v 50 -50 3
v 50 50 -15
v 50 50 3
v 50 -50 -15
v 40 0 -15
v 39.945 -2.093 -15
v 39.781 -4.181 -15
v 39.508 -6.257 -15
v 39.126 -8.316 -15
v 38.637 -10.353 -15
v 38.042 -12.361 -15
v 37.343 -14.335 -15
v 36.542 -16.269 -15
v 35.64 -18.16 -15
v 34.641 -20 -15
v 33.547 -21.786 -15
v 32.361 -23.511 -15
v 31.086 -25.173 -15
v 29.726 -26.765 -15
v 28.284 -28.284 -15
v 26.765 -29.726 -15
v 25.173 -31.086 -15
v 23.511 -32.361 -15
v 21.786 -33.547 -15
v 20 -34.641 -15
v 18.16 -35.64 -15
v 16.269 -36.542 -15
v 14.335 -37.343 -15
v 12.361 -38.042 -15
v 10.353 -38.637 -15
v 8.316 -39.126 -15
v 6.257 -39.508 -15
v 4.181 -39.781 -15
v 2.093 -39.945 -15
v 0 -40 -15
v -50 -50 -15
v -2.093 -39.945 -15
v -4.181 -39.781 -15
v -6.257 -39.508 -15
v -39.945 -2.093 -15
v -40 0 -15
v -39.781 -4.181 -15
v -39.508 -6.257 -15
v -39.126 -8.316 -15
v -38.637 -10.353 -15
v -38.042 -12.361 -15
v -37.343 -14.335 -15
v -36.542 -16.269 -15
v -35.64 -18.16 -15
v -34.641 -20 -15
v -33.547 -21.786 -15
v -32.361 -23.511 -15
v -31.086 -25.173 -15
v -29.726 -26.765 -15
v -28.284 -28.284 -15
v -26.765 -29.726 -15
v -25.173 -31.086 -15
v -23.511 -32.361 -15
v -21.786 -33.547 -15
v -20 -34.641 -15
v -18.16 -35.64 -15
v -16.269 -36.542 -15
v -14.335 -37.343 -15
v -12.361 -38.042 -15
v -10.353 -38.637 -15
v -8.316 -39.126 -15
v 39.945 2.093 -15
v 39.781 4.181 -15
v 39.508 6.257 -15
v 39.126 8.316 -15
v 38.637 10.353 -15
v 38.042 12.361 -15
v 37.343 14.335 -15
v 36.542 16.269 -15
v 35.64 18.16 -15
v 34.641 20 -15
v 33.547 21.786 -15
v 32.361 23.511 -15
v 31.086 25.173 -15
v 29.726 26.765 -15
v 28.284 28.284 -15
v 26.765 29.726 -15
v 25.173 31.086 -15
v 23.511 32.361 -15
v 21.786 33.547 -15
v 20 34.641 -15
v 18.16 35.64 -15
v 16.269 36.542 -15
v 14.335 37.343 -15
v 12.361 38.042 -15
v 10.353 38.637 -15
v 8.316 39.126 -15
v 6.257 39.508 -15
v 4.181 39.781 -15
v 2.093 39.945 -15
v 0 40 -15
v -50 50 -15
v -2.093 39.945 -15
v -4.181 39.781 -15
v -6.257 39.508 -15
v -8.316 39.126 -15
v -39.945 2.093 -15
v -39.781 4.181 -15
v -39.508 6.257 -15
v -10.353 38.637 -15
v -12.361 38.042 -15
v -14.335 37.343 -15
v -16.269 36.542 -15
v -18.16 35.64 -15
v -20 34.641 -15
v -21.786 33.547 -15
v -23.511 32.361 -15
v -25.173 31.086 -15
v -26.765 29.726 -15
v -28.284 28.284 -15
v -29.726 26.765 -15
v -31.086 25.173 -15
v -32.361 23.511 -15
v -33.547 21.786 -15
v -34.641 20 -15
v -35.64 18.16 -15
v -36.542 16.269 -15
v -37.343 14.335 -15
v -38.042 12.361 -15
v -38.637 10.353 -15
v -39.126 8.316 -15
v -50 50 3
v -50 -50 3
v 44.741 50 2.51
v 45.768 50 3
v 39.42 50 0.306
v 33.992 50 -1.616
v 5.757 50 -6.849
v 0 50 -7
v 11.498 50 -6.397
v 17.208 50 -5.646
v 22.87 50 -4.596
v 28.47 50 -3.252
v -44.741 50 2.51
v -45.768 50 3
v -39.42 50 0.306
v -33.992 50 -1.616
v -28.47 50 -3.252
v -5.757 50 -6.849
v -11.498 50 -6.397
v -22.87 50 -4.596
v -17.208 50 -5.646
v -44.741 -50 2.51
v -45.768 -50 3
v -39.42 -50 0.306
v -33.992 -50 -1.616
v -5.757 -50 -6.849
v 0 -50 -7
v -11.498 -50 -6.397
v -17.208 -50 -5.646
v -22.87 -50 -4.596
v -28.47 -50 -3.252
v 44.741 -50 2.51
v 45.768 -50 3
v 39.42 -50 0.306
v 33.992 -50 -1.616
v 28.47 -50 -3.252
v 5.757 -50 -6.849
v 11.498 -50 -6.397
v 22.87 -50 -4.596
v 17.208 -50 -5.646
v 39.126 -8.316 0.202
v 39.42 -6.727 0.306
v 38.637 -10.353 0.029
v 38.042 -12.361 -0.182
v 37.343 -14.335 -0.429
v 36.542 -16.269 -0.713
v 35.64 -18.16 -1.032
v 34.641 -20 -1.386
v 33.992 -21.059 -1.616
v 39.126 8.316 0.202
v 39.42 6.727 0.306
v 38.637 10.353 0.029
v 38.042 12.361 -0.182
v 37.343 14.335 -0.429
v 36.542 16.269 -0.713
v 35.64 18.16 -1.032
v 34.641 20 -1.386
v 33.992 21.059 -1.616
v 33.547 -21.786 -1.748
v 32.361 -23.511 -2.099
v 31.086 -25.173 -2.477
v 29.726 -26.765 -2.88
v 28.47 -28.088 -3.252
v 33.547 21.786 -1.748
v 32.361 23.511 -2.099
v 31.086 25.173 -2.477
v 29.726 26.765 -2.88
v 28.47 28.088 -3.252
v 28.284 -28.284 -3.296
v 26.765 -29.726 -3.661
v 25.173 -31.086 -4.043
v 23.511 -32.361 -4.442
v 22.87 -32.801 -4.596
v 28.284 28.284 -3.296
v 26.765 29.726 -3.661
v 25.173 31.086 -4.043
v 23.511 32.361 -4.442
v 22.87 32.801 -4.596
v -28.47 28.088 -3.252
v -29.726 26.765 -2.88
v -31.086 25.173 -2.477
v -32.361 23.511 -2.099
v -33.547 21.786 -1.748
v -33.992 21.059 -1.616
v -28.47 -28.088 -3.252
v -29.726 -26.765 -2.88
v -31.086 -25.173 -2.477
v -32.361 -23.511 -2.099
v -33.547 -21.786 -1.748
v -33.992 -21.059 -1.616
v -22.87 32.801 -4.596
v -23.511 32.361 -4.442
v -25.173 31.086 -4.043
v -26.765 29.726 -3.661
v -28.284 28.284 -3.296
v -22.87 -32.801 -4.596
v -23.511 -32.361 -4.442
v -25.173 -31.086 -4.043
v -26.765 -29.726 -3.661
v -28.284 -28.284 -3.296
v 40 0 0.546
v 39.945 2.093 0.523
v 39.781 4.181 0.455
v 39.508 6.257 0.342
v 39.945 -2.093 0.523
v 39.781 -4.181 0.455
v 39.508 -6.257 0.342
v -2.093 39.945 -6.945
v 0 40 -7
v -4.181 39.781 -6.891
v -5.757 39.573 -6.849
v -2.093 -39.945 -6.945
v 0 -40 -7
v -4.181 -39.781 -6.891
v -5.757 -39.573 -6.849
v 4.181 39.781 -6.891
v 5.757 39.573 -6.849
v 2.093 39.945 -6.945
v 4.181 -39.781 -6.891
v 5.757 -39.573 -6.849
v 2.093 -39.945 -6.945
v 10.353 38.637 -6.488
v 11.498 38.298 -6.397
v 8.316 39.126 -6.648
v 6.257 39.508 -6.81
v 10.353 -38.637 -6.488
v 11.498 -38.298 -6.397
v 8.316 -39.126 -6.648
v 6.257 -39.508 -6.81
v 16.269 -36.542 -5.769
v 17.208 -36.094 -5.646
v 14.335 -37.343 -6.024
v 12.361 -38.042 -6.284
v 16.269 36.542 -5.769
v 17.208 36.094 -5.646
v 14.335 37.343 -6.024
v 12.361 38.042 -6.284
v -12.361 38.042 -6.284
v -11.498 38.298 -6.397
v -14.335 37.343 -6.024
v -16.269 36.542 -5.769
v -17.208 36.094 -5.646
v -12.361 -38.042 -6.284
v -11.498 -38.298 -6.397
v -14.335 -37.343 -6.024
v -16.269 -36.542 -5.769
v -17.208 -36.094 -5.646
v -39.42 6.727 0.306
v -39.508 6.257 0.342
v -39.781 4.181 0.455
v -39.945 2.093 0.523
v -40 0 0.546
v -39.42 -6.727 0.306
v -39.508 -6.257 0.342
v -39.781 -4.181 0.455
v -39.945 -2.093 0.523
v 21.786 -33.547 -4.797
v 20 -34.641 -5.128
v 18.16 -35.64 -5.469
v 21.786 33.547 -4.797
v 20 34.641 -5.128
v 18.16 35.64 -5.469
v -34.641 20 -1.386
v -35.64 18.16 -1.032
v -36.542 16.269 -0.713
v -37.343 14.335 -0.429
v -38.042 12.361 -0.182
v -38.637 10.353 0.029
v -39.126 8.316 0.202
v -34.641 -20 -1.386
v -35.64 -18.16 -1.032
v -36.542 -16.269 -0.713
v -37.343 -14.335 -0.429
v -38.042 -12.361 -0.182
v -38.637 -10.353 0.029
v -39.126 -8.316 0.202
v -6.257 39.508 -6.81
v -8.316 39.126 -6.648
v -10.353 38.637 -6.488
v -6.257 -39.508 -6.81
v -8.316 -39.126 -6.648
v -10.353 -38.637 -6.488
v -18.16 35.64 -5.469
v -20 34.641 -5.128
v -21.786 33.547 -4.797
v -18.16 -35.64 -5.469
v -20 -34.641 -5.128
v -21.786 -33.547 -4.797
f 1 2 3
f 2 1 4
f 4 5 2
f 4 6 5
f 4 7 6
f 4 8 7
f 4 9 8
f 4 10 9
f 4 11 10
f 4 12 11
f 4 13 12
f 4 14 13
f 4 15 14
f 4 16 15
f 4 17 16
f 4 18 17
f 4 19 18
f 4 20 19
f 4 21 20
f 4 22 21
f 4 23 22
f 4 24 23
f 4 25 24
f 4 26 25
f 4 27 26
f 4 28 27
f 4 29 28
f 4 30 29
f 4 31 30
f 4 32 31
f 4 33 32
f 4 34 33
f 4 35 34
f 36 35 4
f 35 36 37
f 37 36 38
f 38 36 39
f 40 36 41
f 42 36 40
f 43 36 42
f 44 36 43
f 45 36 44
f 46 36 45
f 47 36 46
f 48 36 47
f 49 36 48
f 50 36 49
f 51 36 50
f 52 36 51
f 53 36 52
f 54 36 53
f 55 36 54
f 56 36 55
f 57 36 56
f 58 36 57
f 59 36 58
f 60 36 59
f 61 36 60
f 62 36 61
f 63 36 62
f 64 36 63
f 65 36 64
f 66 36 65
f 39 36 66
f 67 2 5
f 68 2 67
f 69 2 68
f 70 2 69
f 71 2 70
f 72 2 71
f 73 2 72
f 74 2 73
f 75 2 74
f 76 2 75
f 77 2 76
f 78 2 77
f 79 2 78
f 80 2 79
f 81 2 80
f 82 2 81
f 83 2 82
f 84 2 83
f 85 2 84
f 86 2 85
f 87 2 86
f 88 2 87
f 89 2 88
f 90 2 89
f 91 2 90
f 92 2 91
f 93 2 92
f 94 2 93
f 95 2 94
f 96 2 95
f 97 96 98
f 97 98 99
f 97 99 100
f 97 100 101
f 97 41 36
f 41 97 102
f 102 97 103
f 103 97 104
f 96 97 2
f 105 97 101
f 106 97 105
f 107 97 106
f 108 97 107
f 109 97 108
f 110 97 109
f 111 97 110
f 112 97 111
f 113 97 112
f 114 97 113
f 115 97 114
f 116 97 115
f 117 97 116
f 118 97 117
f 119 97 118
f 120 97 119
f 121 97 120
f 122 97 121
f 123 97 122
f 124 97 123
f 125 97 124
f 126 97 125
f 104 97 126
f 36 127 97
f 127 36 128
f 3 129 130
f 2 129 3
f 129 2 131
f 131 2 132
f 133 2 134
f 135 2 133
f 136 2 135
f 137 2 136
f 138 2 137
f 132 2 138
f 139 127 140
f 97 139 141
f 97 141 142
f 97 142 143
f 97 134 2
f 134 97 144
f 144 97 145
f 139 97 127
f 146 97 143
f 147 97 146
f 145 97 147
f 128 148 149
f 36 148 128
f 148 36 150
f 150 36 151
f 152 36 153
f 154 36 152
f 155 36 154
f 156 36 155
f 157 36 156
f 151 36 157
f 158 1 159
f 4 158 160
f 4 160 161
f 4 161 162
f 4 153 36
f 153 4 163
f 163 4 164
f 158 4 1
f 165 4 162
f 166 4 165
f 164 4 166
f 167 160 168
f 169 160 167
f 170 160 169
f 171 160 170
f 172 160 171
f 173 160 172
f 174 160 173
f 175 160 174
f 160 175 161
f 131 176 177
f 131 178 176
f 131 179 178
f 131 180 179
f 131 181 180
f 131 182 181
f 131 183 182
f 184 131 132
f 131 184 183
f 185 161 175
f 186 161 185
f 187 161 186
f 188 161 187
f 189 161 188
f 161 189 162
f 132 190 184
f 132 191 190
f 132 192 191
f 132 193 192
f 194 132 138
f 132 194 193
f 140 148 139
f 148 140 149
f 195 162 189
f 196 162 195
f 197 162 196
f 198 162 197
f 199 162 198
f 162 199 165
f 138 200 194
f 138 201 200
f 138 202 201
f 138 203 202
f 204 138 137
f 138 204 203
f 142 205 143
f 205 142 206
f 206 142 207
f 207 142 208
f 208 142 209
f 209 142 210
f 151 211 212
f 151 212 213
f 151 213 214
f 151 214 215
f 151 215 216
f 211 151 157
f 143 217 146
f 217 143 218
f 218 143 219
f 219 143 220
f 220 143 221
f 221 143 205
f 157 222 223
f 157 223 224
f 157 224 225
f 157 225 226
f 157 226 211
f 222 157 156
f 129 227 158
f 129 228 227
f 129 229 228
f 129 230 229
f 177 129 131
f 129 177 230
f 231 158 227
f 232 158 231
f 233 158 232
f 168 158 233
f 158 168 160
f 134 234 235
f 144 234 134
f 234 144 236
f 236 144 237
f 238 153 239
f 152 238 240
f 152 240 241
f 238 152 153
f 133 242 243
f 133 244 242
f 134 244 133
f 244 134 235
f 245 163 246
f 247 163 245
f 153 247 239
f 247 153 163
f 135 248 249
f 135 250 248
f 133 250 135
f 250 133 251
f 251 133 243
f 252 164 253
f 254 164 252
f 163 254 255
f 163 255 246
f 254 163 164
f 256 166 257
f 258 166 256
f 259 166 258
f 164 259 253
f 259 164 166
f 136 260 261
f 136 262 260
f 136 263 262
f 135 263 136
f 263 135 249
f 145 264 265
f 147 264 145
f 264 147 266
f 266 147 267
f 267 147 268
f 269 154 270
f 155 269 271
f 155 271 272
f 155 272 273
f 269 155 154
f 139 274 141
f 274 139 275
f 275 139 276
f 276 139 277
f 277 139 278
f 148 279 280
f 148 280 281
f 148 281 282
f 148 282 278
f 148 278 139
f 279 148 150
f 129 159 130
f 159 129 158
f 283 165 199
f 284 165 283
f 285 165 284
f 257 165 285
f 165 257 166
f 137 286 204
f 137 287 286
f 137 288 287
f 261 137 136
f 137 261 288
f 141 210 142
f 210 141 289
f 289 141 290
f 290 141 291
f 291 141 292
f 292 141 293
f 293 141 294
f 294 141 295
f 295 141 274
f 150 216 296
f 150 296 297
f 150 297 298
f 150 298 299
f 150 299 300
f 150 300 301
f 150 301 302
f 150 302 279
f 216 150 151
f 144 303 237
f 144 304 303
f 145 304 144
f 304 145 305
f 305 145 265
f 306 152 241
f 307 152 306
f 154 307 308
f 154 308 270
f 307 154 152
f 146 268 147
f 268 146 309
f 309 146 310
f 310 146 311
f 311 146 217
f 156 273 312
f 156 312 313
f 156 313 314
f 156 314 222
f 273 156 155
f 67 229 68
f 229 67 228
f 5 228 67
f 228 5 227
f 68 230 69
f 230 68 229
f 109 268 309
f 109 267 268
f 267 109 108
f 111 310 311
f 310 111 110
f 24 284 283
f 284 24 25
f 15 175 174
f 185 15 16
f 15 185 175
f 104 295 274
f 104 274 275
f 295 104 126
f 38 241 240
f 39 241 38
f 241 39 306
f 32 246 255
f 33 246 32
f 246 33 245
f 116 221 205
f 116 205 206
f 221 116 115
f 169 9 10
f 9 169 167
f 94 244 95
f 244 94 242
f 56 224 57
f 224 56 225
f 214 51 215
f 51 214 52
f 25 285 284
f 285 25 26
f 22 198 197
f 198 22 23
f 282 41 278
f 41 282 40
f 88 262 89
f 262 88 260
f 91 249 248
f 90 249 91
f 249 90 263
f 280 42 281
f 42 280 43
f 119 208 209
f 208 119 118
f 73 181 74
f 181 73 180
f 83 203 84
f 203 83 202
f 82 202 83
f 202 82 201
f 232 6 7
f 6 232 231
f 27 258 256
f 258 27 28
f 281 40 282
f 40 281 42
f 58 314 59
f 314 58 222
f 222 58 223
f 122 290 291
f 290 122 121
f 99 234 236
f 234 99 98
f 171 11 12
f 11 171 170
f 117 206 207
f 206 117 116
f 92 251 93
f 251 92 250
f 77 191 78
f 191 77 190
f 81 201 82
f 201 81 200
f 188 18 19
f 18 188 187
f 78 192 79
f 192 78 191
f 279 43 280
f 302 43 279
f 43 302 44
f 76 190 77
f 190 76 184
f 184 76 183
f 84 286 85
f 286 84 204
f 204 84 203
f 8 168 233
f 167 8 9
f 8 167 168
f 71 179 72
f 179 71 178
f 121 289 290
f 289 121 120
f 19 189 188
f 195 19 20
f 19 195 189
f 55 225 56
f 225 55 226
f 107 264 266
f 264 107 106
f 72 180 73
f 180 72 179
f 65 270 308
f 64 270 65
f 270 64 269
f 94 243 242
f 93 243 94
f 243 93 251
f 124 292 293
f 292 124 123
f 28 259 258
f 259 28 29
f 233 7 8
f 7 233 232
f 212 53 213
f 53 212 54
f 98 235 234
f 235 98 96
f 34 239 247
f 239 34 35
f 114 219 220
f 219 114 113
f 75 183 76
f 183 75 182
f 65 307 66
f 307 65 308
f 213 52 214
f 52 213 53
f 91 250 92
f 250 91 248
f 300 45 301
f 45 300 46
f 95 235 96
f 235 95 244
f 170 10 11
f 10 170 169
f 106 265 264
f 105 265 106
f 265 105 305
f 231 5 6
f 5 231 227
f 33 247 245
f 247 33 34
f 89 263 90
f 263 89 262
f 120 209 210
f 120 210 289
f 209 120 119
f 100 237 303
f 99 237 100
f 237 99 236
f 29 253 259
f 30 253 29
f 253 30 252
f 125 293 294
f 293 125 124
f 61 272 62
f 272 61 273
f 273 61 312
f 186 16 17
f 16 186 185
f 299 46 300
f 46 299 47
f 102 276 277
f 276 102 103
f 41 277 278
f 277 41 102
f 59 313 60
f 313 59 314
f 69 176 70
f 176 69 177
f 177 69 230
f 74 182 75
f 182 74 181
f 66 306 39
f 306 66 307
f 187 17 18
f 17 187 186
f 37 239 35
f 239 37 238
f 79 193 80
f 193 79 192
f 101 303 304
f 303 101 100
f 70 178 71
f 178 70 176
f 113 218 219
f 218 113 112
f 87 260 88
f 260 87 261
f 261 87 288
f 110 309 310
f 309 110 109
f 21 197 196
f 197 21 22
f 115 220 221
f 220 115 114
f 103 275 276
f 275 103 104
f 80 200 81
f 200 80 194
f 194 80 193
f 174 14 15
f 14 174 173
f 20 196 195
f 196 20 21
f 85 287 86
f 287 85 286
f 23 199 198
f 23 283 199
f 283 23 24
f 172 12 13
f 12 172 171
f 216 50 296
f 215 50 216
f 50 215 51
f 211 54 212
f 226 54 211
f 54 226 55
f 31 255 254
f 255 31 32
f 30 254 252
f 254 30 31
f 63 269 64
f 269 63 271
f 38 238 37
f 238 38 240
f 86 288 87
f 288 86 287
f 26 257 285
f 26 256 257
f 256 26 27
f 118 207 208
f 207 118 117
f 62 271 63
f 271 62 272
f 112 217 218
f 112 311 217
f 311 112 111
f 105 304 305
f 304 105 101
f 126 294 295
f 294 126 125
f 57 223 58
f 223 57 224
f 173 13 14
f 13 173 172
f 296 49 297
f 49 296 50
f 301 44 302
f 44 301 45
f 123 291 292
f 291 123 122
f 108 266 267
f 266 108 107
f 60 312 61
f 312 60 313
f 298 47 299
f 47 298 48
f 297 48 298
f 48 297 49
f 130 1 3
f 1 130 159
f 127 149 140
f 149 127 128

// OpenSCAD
$fs = 0.1;
$fa = 3;
$epsilon = 0.01;

function  f(x) = ((107 - x) / (107 - 25) * 22 + 0.5) / 2;

module wmf_ruler() {
    linear_extrude(height = 10) {
        polygon([
            [f(107), 0],
            [f(95), 5],
            [f(78), 10],
            [f(60), 15],
            [f(44), 20],
            [f(31), 25],
            [f(26), 30],
            [f(25), 35],
            [f(26), 40],
            [f(31), 50],
            [f(36), 60],
            [f(40), 70],
            [f(44), 80],
            [15, 80], [15, 0]
        ]);
    }
}

module rack_d22() {
    $r = 220 / 2;
    $depth = 100;
    $width = 100;
    $height = 30;
    difference() {
    color("red")
        cube([$width, $depth, $height], center = true);
        
        translate([0, 0, $r - $height / 2 + 8])
        rotate([90, 0, 0])
        cylinder(h = $depth, r = $r, center = true);
        
        cylinder(h = $height, r = $depth / 2 - 10, center = true);
        
        translate([0, 0, 18])
        cube([$width, $depth, $height], center = true);
    }
}

module rack_d17() {
    $r = 170 / 2;
    $depth = 50;
    $width = 50;
    $height = 30;
    difference() {
    color("red")
        cube([$width, $depth, $height], center = true);
        
        translate([0, 0, $r - $height / 2 + 5])
        rotate([90, 0, 0])
        cylinder(h = $depth, r = $r, center = true);
        
        cylinder(h = $height, r = $depth / 2 - 5, center = true);
        
        translate([0, 0, 8])
        cube([$width, $depth, $height], center = true);
    }
}

rack_d22();
